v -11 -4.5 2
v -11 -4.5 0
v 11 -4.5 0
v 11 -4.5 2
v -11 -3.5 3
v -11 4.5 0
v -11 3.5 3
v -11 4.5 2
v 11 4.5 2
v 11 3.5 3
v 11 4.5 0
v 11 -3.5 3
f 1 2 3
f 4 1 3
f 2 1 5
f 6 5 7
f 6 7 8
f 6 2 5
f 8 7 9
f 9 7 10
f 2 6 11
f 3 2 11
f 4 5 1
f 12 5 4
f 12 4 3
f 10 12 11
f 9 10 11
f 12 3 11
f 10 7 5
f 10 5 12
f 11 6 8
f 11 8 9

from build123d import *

# Parameters (mm, degrees)
SKETCH_1_W      = 22
SKETCH_1_H      = 9
EXTRUDE_1_DEPTH = 3
CHAMFER_1_SIZE  = 1


with BuildPart() as part:
    # Эскиз1 → Вытянуть1 (new body)
    with BuildSketch(Plane.XY):
        Rectangle(SKETCH_1_W, SKETCH_1_H)
    extrude(amount=EXTRUDE_1_DEPTH)

    # Фаска1
    chamfer_1_edges = [part.edges().sort_by_distance(p)[0] for p in [
        (0, 4.5, 3),
        (0, -4.5, 3),
    ]]
    chamfer(chamfer_1_edges, length=CHAMFER_1_SIZE)


solid = part.part
